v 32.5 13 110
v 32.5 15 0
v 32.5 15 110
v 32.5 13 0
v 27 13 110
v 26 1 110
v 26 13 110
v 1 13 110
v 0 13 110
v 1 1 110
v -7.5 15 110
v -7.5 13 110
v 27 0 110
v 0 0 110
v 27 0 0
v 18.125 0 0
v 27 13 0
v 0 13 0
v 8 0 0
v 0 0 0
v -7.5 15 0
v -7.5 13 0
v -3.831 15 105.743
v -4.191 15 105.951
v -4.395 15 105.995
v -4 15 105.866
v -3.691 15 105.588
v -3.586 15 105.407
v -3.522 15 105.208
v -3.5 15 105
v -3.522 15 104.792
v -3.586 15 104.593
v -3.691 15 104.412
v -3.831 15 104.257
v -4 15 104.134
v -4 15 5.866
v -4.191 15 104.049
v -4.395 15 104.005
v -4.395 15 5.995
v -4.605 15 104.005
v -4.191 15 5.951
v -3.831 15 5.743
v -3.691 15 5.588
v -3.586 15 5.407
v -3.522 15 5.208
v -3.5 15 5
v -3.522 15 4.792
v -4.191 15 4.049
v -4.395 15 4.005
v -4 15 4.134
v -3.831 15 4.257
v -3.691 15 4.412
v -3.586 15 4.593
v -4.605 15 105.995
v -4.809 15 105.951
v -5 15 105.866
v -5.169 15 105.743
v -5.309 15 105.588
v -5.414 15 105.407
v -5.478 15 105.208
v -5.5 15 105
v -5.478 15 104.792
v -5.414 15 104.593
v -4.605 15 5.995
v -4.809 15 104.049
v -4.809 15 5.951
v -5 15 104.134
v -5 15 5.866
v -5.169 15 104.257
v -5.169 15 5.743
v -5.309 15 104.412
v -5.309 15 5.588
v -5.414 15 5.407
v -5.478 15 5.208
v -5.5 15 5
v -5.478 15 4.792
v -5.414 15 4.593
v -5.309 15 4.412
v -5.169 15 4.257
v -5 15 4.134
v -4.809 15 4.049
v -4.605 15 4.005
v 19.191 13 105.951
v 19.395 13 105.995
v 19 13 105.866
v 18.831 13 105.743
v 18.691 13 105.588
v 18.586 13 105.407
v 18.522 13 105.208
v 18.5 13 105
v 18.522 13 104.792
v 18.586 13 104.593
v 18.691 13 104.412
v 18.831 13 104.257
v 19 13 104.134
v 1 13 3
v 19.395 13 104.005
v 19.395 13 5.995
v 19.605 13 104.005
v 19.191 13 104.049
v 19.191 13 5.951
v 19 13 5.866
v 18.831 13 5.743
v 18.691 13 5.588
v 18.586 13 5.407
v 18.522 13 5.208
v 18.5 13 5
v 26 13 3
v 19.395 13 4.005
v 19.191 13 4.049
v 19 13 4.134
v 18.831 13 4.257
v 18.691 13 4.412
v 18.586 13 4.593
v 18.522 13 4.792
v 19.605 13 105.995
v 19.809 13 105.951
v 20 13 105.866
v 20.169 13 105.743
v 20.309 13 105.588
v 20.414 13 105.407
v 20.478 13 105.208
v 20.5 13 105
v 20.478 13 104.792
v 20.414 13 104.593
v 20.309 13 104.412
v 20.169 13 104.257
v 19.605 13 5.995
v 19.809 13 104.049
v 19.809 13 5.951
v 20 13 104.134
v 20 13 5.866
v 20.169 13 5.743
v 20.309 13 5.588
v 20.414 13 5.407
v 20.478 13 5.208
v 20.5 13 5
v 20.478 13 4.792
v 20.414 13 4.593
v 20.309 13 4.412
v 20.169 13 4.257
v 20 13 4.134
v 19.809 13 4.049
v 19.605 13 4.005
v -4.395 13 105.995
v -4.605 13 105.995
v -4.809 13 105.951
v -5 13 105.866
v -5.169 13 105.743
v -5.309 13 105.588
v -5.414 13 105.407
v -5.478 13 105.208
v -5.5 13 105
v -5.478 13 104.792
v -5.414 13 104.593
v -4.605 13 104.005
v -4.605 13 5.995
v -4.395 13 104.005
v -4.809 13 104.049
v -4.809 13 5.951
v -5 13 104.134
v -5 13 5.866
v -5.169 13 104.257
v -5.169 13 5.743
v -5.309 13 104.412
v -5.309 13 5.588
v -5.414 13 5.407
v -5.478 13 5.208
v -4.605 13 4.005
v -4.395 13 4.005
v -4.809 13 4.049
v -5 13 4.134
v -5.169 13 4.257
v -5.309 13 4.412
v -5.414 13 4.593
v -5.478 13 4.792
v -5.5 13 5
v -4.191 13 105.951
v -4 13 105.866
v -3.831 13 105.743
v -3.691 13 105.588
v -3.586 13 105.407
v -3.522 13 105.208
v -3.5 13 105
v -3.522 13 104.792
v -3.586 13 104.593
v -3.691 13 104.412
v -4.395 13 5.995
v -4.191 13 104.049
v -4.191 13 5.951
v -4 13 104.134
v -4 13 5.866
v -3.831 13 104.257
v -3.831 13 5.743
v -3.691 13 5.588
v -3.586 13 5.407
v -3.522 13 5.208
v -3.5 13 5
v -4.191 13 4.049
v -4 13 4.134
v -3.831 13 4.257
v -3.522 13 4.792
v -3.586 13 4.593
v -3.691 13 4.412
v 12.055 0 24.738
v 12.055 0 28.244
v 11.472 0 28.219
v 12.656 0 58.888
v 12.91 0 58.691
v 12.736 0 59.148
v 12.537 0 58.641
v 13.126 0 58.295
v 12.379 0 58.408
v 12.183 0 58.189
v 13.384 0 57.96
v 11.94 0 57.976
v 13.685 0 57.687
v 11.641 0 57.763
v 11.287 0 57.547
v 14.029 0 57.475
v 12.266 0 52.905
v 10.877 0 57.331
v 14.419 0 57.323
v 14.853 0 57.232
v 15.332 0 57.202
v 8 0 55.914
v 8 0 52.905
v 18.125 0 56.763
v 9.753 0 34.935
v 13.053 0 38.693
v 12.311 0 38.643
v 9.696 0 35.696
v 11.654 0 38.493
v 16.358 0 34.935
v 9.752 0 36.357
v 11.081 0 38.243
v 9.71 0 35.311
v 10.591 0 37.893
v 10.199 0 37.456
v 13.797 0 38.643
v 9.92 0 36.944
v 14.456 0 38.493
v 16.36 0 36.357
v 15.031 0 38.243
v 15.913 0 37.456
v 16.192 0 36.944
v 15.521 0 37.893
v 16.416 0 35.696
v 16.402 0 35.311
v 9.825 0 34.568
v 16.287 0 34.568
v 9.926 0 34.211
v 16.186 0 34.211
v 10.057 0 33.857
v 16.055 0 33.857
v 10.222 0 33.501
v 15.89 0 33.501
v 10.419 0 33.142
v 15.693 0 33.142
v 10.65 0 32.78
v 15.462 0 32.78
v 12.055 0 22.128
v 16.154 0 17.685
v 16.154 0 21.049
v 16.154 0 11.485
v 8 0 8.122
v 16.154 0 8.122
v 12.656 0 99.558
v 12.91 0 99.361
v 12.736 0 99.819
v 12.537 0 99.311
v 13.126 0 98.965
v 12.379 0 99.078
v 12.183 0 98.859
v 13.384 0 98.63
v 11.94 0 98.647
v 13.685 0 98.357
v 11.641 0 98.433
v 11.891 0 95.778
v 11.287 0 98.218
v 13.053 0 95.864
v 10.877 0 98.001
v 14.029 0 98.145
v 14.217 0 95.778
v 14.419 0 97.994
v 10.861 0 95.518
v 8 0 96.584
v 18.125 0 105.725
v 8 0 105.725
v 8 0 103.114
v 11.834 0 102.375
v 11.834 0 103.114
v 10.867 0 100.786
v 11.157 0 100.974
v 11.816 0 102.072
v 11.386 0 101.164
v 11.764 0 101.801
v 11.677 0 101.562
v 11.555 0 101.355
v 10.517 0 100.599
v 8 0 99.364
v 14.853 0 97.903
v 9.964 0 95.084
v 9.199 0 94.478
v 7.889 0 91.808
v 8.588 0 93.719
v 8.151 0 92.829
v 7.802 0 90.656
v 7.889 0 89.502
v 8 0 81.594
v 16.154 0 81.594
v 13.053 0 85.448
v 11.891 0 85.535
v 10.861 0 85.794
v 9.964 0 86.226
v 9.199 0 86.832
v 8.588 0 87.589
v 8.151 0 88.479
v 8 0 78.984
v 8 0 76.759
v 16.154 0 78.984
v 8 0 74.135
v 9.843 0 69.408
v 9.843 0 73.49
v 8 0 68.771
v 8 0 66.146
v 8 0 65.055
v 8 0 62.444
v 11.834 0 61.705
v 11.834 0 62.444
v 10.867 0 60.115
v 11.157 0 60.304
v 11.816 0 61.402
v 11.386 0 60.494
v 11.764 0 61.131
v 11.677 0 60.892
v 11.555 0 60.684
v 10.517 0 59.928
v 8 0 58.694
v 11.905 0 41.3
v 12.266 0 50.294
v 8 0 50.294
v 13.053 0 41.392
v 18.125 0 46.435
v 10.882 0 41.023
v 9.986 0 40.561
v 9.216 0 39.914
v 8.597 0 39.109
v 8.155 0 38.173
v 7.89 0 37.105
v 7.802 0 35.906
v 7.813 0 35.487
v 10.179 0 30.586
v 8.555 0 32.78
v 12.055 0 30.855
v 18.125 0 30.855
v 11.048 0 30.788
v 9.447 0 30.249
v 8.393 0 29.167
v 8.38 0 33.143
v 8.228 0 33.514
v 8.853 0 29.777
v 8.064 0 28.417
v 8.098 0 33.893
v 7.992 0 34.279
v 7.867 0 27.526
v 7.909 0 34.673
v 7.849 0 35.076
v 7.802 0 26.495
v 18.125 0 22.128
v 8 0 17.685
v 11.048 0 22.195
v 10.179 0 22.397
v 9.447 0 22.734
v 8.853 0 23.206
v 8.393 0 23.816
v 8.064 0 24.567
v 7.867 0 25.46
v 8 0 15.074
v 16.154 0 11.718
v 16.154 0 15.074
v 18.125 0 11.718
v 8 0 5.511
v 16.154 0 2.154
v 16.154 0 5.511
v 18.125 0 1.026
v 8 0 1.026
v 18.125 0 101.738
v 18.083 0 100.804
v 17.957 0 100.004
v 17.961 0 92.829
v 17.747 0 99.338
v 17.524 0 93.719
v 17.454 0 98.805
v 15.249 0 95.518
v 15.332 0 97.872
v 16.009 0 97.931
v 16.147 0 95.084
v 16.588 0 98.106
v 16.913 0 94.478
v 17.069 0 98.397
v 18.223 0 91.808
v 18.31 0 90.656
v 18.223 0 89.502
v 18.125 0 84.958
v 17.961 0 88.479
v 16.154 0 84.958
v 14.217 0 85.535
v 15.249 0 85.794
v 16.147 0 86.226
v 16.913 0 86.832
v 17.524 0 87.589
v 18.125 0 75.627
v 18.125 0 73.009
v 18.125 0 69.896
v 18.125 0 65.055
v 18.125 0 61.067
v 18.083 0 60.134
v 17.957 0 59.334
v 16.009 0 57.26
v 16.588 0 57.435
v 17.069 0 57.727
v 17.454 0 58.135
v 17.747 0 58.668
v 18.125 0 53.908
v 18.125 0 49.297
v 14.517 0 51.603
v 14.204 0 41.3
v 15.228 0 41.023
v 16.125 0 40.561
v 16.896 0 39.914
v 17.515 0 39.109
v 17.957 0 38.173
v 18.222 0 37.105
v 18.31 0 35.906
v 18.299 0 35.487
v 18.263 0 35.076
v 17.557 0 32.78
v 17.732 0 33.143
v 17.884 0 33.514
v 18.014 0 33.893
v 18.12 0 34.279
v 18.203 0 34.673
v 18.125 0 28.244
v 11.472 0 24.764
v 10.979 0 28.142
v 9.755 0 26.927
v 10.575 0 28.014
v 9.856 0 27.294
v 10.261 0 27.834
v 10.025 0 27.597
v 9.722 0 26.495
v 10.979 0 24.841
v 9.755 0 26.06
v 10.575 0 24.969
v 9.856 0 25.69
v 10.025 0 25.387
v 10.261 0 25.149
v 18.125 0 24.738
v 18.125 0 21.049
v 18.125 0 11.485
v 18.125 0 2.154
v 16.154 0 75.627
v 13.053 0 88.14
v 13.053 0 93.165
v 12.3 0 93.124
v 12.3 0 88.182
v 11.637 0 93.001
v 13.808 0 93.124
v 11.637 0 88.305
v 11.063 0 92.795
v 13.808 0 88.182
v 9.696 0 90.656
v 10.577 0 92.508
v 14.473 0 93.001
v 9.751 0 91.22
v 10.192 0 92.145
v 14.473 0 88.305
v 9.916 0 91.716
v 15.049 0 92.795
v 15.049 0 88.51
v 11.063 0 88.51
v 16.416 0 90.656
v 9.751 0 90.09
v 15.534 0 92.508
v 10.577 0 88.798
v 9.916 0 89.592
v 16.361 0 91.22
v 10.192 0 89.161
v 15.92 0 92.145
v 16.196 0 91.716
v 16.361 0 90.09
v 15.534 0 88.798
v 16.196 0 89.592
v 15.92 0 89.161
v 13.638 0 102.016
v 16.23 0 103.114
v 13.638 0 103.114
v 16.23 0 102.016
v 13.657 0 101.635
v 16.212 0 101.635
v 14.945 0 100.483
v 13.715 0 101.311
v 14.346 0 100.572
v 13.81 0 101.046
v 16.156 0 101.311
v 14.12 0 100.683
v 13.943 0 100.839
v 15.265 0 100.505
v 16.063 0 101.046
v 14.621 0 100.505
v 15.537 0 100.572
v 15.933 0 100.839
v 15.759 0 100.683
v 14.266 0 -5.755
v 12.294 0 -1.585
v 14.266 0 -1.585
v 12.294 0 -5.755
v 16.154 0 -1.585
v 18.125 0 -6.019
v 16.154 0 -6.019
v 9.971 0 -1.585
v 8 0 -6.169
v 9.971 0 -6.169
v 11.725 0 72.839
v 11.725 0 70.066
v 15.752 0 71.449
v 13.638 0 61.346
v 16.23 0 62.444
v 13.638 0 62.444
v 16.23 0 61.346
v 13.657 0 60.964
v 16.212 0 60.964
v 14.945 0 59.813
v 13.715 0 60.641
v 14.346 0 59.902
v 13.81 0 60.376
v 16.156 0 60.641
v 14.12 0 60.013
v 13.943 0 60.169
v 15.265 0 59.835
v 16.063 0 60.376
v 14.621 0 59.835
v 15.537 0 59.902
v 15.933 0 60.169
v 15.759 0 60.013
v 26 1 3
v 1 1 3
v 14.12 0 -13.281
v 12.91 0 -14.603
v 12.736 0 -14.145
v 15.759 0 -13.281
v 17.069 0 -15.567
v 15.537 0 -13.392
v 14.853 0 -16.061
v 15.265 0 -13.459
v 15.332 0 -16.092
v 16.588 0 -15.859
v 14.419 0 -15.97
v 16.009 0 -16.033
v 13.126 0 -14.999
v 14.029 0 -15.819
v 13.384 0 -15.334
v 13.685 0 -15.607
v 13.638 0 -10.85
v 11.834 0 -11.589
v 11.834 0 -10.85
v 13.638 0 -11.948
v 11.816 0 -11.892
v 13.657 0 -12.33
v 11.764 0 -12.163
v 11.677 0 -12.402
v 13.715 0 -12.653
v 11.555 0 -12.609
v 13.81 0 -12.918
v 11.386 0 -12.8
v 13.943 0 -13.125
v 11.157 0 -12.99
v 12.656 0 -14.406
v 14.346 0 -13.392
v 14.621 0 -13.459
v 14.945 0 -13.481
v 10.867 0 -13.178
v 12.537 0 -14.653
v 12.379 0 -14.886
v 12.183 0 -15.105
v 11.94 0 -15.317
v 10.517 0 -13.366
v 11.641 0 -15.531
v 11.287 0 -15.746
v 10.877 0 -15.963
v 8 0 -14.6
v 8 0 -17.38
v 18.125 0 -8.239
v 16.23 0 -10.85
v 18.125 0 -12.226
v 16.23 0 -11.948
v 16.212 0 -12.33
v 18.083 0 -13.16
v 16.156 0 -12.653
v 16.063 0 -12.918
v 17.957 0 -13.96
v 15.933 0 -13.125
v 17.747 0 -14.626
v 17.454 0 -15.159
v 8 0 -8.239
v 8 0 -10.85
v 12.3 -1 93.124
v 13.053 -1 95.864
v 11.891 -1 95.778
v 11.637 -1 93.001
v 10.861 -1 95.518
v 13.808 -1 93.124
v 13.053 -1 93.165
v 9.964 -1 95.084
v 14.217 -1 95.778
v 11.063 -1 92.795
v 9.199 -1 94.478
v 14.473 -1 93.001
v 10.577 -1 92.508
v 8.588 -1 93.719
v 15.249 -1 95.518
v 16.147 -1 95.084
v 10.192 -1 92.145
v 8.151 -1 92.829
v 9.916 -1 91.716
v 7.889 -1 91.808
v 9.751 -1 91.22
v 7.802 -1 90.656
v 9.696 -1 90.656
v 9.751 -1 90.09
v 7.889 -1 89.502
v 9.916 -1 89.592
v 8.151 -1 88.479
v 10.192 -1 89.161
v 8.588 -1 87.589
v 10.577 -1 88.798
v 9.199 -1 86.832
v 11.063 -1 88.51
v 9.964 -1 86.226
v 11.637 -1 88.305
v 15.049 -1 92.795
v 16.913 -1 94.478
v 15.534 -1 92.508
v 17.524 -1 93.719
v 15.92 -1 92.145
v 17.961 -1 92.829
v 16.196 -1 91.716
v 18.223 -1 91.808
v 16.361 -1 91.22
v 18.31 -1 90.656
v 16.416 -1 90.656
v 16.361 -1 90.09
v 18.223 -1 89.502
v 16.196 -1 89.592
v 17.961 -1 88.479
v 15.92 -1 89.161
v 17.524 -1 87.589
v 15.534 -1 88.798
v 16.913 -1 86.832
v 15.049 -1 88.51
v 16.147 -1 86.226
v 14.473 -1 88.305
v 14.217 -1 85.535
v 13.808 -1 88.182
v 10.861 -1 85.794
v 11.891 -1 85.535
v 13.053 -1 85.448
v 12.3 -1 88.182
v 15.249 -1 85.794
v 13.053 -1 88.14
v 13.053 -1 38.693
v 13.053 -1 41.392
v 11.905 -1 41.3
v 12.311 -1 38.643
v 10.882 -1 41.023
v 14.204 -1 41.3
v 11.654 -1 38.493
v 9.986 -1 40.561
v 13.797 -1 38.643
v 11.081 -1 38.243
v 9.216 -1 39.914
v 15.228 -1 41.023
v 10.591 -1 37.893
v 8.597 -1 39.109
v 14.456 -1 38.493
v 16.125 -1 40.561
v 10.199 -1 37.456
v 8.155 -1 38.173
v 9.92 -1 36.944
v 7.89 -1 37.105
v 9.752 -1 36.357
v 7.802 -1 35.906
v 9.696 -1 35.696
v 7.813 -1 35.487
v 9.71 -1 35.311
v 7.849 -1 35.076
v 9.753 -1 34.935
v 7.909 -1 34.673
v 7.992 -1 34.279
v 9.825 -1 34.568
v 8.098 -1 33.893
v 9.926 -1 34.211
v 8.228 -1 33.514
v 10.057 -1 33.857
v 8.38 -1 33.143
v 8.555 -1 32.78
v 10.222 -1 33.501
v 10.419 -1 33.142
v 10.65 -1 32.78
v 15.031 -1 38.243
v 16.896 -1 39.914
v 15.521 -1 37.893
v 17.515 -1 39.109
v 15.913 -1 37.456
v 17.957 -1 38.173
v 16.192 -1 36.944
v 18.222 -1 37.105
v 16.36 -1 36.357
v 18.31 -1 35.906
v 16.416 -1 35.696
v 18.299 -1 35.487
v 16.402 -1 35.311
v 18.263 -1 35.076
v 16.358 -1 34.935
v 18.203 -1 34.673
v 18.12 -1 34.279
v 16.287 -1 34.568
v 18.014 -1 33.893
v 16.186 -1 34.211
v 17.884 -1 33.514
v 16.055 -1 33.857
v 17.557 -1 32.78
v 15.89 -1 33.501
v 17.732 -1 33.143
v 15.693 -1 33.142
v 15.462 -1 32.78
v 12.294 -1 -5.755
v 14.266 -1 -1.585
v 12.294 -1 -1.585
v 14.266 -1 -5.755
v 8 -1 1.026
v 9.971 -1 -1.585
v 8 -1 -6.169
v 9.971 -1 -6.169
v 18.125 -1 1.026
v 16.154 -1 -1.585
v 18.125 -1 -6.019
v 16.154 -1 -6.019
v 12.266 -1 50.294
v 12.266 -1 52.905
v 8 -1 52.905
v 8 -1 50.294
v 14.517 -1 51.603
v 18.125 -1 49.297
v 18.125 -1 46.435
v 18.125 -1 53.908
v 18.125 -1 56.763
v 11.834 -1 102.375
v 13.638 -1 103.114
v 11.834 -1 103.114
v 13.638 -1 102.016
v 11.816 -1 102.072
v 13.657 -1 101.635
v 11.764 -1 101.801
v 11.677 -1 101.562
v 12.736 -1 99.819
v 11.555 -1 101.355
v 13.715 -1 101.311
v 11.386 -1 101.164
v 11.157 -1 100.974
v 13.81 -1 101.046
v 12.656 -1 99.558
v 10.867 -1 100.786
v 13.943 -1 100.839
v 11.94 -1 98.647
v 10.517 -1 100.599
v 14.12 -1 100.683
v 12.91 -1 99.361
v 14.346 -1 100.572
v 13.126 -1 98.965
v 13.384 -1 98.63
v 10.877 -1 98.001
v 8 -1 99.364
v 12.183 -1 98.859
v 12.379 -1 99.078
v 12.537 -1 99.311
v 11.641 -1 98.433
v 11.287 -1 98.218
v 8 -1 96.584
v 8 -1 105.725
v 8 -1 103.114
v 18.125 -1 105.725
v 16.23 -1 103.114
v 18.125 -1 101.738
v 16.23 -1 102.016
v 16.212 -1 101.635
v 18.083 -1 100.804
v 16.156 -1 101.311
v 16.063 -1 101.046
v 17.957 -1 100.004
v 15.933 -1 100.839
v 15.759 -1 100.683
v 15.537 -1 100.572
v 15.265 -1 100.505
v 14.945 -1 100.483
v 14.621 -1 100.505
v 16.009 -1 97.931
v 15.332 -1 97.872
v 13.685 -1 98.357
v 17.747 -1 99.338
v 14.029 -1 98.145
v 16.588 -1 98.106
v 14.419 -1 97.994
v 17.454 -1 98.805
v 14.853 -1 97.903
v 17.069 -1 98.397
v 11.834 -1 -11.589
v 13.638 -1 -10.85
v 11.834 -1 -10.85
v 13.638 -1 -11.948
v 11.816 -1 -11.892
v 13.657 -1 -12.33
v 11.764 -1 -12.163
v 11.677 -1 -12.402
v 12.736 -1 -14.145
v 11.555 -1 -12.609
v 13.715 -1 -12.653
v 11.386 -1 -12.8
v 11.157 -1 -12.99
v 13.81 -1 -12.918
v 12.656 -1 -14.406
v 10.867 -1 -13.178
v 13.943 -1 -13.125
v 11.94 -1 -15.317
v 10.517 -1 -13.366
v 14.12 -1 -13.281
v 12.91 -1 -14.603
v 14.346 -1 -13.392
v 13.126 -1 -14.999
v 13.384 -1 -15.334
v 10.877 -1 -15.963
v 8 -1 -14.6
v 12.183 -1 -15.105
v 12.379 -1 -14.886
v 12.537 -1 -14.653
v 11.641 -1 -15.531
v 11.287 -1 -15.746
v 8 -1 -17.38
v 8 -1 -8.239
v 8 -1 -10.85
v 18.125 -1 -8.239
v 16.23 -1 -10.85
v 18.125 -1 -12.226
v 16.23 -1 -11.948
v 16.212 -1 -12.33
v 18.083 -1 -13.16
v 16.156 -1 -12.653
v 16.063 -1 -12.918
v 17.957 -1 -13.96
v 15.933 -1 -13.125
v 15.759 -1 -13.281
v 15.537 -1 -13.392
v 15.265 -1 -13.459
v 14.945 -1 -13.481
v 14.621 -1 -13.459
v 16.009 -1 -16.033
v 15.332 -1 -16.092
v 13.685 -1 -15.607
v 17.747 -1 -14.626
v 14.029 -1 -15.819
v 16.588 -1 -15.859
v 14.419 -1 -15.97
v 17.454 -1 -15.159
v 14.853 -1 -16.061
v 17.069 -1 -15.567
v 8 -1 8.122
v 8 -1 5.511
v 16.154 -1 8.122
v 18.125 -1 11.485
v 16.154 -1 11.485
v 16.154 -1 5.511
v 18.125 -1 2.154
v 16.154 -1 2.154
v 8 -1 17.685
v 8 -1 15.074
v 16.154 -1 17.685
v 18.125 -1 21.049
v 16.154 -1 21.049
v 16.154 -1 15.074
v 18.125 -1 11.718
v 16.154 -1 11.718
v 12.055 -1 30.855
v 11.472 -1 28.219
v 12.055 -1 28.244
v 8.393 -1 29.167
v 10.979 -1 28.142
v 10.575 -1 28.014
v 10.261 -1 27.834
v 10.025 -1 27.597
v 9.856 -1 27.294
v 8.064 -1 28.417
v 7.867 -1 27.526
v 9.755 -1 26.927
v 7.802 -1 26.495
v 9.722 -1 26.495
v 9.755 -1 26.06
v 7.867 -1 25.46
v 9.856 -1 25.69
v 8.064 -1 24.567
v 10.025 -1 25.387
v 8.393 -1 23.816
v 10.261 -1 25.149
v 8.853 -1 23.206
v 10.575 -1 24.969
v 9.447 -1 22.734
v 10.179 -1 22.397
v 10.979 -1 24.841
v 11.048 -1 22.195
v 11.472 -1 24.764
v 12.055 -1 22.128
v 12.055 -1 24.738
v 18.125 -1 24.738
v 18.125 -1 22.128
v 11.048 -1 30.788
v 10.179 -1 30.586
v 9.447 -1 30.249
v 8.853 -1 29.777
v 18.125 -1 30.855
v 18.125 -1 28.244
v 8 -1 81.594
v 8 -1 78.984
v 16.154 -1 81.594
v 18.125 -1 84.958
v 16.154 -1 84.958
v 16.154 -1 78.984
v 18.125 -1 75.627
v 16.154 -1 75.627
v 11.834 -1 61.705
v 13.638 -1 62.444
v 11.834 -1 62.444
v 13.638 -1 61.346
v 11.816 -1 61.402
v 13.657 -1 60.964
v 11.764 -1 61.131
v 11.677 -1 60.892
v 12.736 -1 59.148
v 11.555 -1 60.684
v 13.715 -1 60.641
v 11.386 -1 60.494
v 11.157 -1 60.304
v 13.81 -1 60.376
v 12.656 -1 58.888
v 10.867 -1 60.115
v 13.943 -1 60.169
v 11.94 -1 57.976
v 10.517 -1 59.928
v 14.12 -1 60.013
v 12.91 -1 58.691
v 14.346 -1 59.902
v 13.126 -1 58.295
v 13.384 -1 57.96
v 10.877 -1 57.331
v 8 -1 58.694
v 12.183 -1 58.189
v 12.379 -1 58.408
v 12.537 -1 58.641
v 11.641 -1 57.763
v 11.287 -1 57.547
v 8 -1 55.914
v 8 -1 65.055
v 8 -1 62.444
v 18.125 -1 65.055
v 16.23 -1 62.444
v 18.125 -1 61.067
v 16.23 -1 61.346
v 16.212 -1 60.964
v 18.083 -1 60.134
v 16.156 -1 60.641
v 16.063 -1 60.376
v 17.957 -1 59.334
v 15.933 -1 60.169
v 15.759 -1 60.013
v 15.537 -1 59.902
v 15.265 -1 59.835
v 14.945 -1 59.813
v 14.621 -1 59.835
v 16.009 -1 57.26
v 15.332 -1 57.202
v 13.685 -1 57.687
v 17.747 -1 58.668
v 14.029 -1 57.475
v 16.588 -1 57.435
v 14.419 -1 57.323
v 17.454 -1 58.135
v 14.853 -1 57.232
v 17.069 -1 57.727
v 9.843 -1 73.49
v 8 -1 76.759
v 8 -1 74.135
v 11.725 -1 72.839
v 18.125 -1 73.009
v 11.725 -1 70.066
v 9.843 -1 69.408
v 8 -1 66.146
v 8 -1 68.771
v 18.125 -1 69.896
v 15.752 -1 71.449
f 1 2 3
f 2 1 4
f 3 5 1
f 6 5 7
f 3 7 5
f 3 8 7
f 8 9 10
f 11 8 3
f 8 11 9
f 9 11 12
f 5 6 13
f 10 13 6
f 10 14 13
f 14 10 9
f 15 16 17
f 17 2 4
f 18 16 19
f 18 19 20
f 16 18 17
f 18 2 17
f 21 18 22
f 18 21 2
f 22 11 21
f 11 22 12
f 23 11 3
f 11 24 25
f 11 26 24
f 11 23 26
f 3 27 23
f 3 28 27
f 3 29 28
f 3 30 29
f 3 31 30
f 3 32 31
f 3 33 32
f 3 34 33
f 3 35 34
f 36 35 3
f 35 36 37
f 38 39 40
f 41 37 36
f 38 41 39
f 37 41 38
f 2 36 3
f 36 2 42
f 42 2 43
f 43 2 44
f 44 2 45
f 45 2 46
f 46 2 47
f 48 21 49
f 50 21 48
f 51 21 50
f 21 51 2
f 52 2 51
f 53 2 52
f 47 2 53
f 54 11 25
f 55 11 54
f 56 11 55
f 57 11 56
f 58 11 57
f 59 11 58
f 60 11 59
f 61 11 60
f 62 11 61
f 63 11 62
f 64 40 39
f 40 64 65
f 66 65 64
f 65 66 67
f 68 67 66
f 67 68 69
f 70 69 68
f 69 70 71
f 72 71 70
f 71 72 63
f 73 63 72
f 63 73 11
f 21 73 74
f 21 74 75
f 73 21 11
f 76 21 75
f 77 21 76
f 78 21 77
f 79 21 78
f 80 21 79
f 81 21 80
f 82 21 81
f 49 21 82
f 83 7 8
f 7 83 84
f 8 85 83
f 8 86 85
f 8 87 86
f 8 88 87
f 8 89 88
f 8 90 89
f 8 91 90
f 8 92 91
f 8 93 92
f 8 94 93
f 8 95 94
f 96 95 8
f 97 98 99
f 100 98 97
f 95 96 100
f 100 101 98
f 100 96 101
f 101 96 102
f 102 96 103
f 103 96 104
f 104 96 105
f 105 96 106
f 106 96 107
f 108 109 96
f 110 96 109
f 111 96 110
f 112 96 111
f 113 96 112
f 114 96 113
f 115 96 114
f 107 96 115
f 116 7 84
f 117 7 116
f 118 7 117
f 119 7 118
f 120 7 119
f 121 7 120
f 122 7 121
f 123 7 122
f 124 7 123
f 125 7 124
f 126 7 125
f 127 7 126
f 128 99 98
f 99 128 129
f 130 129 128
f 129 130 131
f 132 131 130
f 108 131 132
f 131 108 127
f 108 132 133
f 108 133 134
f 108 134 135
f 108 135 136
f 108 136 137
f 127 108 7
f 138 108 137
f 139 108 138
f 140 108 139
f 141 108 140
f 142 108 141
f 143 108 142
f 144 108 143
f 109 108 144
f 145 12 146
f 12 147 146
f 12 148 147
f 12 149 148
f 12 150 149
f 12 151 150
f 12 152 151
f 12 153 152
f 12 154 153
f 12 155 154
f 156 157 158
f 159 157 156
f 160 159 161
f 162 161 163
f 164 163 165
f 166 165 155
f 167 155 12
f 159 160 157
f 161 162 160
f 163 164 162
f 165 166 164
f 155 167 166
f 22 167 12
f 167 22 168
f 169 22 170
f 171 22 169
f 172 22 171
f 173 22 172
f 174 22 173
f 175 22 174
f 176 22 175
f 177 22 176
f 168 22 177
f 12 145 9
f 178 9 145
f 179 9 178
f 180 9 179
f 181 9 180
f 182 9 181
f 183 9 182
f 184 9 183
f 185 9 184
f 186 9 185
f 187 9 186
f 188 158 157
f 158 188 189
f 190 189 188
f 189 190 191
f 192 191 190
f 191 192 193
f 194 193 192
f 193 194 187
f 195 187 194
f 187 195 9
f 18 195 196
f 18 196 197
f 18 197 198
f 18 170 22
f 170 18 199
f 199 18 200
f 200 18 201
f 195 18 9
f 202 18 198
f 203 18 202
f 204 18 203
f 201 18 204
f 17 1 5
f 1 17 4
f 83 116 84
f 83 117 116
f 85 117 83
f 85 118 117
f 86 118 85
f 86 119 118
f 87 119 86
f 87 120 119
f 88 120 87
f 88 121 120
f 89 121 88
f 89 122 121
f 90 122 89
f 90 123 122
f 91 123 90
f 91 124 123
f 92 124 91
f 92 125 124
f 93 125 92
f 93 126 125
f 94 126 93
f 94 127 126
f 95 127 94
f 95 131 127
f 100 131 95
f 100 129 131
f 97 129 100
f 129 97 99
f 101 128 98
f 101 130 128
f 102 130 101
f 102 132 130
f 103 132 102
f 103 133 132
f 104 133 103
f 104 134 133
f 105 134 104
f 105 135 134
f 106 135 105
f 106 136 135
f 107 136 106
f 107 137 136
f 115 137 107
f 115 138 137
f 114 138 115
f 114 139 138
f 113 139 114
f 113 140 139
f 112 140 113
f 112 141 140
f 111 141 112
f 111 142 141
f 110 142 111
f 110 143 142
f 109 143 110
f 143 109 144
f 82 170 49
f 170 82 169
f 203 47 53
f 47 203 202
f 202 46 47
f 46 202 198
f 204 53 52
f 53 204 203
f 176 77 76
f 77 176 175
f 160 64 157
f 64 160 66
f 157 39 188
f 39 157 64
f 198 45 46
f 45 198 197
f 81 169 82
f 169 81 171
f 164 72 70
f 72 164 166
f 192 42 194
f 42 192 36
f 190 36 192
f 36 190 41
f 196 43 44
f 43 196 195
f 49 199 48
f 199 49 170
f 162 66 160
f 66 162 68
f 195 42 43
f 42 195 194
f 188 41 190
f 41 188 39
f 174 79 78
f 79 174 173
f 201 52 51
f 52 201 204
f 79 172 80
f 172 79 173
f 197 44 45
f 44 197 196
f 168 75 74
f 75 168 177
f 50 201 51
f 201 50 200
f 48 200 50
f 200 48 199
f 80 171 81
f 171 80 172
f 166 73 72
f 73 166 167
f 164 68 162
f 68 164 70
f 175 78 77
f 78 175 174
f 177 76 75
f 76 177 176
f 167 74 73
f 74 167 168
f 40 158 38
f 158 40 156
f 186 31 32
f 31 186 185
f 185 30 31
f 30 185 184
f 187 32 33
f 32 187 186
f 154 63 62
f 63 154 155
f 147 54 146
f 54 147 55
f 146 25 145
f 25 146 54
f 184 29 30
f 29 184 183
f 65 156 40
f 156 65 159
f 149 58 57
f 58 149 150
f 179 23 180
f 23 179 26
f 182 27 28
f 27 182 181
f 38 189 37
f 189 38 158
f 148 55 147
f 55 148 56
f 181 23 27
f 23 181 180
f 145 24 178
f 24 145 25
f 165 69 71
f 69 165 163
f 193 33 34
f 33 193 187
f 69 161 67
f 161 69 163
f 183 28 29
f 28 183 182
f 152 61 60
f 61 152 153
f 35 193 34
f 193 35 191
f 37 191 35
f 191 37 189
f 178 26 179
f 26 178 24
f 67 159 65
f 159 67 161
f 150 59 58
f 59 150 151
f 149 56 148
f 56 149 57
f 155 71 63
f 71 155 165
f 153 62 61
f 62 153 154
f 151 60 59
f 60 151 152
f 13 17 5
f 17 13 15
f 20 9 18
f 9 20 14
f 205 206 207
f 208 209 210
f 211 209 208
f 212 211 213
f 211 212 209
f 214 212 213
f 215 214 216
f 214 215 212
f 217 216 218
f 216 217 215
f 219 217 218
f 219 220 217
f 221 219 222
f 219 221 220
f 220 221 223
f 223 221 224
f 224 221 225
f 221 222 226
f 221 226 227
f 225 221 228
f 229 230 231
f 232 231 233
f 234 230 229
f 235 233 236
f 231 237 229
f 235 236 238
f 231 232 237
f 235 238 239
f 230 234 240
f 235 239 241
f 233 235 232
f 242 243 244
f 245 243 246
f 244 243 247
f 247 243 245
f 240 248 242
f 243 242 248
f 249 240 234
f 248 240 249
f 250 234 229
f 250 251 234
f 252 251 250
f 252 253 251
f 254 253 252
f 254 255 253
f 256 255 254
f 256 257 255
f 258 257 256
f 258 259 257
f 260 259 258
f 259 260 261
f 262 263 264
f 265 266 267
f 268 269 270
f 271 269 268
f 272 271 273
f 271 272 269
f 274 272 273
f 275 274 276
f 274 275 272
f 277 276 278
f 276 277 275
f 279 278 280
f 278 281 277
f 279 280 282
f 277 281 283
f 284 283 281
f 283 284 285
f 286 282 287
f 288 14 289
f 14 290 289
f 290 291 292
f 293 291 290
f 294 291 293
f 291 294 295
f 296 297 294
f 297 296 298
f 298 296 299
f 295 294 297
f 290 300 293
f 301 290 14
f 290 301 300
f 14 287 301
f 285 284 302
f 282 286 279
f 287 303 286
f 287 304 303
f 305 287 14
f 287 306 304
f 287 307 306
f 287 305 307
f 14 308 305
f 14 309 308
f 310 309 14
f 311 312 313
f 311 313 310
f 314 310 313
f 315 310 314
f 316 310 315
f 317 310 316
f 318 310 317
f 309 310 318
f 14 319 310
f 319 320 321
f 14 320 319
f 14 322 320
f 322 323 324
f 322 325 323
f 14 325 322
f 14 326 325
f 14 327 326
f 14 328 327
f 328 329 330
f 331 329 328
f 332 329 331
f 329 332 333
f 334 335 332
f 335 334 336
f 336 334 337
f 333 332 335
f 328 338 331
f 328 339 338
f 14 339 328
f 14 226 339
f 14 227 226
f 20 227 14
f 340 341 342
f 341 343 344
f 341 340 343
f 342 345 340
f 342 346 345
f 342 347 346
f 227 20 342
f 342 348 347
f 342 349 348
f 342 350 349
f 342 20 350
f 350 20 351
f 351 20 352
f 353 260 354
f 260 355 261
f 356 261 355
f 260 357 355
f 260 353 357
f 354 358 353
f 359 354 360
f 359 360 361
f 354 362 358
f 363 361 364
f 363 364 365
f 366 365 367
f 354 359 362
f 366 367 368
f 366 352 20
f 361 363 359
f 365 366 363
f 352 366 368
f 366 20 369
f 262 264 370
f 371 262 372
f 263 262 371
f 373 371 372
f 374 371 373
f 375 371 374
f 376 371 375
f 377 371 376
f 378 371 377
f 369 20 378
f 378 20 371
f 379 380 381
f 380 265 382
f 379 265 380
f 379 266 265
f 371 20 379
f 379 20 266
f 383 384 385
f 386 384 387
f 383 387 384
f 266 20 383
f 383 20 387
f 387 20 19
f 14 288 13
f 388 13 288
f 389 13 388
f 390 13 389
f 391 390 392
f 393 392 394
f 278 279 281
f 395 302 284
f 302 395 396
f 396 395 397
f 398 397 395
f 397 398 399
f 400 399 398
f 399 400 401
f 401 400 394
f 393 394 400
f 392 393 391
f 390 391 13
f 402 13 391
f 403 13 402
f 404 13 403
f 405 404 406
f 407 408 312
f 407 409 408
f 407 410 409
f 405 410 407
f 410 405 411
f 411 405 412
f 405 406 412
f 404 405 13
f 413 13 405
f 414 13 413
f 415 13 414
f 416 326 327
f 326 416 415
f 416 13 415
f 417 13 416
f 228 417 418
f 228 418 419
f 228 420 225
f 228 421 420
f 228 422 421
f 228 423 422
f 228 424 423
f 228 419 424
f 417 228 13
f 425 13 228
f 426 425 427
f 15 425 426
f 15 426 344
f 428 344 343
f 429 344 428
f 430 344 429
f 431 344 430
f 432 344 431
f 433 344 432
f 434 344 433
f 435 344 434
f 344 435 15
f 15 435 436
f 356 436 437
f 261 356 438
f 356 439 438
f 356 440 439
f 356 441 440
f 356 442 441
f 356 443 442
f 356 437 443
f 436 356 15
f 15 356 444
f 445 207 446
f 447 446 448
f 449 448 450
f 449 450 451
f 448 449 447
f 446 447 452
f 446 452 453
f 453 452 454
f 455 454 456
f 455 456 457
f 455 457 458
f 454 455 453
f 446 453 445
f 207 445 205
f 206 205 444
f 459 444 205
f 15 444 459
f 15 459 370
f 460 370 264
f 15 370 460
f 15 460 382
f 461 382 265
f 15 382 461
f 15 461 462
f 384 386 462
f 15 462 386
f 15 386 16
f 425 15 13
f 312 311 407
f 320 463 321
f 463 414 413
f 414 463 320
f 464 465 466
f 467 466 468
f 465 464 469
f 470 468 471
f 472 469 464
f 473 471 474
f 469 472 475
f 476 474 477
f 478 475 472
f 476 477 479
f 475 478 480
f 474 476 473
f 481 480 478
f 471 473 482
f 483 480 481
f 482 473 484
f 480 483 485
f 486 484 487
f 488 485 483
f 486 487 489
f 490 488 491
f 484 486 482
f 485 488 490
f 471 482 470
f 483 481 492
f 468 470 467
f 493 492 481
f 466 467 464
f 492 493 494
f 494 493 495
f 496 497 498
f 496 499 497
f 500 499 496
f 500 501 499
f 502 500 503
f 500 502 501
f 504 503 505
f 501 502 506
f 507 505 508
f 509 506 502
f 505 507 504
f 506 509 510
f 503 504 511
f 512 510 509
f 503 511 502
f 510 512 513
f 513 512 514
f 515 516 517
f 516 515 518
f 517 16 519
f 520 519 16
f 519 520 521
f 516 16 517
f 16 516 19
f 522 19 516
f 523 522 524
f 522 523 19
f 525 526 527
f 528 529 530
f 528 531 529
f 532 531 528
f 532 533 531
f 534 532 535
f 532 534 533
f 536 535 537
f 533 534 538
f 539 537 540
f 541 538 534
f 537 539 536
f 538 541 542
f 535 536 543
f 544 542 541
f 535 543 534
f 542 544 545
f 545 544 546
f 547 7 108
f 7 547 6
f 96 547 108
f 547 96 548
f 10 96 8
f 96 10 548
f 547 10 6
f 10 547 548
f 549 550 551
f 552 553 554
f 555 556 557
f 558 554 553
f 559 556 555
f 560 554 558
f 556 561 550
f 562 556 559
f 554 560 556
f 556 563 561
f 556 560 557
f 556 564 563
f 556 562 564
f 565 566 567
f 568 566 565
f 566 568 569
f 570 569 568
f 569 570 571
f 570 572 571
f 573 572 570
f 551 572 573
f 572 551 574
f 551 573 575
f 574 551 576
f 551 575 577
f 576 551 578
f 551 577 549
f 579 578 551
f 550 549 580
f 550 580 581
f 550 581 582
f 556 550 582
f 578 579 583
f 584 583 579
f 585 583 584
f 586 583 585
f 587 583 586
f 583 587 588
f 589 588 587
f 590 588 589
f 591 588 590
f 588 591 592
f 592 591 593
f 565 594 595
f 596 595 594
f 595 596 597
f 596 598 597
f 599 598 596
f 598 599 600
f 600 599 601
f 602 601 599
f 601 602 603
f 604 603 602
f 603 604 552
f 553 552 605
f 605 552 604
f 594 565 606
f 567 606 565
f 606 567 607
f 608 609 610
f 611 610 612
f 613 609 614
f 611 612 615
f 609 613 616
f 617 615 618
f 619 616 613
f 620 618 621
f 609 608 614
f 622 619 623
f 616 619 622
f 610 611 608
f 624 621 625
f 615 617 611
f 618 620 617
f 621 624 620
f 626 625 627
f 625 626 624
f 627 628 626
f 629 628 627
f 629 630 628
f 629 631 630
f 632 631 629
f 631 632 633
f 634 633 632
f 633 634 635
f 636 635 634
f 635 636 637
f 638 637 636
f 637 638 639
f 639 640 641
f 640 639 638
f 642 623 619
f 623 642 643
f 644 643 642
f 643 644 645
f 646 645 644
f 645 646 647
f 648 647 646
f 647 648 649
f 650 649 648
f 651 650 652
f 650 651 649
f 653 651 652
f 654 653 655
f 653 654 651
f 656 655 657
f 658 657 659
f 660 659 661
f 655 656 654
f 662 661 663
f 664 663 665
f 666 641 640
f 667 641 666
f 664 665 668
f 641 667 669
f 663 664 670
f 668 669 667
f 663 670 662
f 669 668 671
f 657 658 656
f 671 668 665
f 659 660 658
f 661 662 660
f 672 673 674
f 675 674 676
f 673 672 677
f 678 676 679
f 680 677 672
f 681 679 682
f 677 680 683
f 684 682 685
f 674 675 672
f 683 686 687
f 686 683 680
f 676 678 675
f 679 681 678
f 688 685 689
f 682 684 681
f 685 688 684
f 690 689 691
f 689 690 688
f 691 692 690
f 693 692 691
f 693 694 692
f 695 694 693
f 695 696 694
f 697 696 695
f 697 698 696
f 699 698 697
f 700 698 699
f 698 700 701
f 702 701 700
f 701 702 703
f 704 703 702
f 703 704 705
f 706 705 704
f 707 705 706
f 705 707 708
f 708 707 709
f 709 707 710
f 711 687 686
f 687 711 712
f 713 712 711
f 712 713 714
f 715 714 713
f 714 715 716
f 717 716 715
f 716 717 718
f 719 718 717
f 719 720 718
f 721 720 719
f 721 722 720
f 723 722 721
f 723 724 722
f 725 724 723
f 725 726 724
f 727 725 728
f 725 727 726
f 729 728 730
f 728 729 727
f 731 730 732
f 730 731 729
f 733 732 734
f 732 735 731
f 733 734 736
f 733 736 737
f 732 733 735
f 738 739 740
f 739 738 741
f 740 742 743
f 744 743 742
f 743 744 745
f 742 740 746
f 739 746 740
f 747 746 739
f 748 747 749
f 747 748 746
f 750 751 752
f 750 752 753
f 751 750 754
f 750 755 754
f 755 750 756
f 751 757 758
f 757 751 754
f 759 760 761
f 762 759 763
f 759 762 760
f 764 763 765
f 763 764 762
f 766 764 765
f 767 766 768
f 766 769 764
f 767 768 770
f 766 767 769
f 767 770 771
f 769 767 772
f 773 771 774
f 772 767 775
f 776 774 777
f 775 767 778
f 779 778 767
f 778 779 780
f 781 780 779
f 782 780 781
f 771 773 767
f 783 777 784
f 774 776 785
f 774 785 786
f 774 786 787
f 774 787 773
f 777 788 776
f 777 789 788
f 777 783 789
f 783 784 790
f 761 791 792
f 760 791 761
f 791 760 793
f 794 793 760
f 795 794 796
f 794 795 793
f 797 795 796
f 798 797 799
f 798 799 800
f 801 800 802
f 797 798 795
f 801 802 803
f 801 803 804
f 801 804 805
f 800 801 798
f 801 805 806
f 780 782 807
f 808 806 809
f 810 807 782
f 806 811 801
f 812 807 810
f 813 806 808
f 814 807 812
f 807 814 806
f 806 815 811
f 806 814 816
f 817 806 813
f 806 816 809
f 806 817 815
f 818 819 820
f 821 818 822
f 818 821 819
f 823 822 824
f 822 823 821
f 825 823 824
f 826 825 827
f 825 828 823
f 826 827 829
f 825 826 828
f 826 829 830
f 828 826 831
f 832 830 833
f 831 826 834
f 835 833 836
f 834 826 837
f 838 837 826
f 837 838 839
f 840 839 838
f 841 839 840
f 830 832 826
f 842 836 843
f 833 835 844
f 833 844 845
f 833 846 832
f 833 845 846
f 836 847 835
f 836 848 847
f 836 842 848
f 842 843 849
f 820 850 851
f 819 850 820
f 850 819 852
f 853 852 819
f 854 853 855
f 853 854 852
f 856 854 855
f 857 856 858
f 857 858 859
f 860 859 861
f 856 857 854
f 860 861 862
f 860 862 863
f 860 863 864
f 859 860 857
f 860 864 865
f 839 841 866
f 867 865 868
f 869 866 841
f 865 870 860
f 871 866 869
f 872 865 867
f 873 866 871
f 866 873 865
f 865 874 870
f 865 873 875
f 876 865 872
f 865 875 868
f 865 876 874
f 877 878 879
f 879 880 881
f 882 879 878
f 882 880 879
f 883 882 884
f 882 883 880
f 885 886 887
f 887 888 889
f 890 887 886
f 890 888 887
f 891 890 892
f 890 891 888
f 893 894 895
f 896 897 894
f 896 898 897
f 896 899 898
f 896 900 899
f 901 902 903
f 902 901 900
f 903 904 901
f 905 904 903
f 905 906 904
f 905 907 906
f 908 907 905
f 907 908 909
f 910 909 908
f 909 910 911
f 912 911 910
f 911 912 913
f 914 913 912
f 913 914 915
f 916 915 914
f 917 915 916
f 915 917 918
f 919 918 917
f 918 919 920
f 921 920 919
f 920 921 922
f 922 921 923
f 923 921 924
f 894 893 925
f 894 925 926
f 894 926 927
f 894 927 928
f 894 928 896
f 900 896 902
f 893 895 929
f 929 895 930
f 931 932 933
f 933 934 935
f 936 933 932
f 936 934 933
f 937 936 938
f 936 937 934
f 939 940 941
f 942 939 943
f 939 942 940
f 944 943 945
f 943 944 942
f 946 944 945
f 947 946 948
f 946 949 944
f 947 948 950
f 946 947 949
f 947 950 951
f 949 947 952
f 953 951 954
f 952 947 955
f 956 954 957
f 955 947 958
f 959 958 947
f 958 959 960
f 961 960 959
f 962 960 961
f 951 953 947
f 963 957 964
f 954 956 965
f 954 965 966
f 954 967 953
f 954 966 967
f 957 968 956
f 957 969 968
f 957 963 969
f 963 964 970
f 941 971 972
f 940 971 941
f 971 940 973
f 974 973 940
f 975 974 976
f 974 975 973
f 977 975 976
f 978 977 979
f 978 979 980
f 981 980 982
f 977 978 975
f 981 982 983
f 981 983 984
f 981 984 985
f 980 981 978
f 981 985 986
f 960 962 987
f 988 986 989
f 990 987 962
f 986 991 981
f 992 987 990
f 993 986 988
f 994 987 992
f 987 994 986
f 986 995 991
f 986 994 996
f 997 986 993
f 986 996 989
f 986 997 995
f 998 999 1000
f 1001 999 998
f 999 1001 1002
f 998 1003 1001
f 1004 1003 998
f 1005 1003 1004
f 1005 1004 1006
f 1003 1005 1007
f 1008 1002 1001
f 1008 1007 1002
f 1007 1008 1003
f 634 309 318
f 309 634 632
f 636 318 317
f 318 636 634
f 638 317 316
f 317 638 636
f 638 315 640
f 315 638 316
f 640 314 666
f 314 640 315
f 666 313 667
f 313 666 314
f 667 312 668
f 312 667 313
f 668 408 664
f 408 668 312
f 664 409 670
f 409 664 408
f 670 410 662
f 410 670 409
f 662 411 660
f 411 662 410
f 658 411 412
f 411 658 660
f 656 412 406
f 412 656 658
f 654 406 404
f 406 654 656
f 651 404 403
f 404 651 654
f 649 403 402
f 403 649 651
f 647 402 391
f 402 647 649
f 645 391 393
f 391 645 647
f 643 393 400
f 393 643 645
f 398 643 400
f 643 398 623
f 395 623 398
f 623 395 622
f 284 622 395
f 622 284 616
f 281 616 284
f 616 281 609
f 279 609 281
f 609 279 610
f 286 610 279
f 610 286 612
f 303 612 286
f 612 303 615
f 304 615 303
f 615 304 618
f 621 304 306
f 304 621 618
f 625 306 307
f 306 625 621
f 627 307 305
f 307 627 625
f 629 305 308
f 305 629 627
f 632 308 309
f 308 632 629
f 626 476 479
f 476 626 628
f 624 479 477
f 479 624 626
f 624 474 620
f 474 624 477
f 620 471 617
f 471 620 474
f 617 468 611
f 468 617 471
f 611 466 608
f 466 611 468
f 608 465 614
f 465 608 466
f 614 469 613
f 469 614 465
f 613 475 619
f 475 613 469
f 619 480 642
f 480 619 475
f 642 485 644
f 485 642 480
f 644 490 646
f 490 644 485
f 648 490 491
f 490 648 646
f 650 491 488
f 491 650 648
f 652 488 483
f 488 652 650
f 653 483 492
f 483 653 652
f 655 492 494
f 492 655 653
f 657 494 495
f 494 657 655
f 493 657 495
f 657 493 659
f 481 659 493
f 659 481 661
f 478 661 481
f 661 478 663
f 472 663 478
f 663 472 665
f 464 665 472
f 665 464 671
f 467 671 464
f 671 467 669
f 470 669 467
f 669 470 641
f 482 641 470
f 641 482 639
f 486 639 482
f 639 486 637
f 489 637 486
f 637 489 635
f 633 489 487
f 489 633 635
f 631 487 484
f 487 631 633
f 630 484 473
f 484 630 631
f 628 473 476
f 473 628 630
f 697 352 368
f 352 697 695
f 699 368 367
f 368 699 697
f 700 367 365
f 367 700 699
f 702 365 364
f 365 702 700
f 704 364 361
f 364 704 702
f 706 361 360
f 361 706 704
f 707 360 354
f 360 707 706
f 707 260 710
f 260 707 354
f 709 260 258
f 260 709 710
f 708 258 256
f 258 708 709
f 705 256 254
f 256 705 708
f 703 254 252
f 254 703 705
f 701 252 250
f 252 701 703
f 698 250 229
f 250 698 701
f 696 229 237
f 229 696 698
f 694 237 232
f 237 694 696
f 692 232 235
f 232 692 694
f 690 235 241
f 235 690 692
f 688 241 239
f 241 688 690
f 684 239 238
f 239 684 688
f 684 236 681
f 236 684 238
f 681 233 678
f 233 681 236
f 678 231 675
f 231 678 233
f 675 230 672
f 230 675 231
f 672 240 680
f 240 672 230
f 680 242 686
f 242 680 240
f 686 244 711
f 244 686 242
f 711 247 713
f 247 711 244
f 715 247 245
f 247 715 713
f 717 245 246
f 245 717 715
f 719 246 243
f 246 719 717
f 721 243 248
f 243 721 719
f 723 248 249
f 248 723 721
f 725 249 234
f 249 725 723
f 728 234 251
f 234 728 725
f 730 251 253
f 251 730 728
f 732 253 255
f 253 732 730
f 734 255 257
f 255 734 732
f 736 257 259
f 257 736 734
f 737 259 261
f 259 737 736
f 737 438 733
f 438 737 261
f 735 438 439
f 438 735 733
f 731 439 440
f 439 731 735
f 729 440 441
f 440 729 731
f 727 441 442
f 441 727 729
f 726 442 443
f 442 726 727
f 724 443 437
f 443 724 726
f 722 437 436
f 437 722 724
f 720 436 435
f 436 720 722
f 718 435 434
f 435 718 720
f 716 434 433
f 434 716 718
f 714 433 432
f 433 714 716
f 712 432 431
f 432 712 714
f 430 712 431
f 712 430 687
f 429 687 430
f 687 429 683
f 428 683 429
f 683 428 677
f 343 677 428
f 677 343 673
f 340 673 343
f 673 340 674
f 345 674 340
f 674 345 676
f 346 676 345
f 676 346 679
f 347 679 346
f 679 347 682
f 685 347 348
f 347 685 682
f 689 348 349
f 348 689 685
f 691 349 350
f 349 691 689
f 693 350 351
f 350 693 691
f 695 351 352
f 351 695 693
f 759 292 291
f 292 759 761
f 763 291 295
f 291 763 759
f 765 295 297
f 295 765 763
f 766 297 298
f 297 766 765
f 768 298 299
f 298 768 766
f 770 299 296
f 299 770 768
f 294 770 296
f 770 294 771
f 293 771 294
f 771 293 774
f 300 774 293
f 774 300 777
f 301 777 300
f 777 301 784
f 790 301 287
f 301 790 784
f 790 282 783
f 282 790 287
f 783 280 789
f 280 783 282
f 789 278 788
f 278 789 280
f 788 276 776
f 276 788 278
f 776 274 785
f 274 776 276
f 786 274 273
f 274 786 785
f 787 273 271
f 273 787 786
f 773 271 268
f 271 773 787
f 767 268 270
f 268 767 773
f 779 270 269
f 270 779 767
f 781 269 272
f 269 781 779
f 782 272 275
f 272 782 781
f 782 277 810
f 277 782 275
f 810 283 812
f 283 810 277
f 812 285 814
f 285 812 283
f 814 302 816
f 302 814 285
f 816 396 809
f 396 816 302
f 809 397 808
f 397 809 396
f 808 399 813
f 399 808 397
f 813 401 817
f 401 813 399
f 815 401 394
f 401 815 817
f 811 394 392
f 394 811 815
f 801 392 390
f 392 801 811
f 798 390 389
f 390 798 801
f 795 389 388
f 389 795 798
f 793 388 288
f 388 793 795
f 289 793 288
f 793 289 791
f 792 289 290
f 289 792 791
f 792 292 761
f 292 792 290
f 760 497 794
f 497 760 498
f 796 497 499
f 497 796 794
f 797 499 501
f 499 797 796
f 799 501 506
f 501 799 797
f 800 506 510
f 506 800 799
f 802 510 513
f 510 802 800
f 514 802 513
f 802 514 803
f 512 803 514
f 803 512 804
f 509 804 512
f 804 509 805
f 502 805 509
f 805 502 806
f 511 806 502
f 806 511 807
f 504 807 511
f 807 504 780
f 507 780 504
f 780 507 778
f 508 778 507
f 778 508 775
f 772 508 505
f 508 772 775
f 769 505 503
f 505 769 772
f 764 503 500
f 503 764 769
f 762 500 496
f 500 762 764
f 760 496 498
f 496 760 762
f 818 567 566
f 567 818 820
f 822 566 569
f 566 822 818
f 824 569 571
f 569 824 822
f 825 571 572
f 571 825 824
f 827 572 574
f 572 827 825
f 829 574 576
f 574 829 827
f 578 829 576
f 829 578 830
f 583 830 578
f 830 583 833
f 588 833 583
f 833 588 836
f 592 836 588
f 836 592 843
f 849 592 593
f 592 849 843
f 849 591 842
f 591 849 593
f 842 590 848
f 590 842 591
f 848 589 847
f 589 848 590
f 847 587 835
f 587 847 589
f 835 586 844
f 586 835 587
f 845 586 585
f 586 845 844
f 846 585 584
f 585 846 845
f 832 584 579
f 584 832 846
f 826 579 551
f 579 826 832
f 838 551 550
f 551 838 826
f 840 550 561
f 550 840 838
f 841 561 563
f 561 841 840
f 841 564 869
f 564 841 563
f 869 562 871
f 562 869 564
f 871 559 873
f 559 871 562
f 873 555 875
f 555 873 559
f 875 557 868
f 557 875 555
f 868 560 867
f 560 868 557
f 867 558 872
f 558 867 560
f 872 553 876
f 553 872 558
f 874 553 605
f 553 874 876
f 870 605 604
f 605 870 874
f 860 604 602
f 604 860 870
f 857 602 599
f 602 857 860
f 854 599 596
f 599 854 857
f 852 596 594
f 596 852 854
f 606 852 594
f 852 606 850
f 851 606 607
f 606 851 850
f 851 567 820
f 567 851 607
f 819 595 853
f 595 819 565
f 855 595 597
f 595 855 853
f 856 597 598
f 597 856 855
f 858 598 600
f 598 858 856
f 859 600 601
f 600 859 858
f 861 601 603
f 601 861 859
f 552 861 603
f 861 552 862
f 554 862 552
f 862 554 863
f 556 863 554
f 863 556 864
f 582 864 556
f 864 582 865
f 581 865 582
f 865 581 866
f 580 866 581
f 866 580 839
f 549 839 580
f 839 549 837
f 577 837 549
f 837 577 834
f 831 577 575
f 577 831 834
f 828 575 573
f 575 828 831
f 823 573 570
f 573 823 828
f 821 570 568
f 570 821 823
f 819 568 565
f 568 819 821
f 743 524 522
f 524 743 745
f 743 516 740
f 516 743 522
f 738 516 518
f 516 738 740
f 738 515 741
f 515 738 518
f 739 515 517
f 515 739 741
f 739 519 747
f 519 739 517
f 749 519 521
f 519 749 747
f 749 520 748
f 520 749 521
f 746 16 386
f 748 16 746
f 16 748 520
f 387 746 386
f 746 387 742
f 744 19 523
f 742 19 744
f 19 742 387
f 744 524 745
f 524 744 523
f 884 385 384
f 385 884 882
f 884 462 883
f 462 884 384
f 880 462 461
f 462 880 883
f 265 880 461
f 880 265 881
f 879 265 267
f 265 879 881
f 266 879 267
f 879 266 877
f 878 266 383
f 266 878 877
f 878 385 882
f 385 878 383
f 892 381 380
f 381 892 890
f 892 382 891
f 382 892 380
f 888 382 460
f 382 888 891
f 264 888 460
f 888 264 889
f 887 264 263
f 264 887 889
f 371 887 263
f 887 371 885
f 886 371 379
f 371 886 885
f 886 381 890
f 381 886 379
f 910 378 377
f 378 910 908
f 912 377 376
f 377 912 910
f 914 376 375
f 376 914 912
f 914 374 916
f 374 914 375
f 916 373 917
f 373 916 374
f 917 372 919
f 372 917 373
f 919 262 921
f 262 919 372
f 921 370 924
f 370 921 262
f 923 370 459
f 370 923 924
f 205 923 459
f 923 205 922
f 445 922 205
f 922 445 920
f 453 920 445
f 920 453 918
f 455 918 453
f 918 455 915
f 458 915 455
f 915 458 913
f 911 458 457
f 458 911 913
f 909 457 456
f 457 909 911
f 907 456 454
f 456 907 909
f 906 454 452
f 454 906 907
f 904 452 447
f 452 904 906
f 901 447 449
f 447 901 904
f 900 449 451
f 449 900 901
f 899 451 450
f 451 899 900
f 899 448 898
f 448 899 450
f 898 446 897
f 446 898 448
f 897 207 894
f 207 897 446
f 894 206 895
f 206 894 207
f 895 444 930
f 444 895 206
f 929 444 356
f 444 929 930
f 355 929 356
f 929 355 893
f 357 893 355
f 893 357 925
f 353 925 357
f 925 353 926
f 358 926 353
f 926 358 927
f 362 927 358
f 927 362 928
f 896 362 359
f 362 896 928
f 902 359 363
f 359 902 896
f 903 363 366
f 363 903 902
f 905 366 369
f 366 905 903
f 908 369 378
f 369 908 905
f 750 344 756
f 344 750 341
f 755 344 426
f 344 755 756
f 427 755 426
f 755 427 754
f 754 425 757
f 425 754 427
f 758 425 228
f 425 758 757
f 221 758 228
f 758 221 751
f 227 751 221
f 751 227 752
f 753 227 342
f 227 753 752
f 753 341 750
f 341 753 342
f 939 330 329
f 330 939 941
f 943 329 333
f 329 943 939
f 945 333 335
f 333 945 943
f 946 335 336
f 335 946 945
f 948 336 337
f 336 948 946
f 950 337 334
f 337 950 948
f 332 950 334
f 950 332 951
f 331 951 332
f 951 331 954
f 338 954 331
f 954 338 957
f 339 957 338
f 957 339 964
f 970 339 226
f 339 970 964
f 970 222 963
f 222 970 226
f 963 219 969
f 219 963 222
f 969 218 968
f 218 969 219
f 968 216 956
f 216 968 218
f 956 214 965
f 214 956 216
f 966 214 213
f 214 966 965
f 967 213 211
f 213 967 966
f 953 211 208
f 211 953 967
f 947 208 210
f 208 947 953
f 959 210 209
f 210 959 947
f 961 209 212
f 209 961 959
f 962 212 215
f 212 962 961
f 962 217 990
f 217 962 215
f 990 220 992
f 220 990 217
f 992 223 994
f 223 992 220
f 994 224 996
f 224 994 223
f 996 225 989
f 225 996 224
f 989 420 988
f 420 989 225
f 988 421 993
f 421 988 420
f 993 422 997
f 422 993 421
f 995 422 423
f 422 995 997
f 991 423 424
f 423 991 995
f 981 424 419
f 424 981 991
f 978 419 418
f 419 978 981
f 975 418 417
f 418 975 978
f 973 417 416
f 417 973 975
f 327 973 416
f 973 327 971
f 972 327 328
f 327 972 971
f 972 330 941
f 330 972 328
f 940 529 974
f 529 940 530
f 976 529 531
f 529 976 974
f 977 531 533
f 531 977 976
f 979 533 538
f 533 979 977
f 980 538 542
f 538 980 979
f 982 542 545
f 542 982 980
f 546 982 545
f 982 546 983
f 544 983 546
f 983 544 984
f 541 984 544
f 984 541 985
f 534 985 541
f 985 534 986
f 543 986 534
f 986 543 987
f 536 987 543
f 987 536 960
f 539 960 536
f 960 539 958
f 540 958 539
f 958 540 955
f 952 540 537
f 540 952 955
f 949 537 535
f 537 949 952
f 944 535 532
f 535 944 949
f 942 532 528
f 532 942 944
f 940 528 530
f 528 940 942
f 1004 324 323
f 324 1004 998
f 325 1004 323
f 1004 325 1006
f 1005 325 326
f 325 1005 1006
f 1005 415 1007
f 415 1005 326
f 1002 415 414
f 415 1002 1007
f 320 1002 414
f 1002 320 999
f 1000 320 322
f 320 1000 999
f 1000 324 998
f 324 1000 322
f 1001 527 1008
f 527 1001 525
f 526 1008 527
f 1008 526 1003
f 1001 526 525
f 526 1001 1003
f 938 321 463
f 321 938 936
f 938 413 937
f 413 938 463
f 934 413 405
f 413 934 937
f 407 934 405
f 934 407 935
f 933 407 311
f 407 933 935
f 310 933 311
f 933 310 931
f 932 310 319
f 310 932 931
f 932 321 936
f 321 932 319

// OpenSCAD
$fn=30;

tw= 25;
td=12;
ttd=15;
th=110;


    box();
    translate([8,0,107])
    rotate([90,90,0])
    linear_extrude(height=1)
    text("ROTARY CUTTER", font = "FONTIN:style=Bold");


module box(){
union(){

translate([-(tw + 15-tw)/2,ttd-2,0])
difference(){
cube([tw + 15,2,th]);
    
    translate([3,0,5])
    rotate([-90,0,0])
    cylinder(r=1,h=4);
    
    translate([3,0,110-5])
    rotate([-90,0,0])
    cylinder(r=1,h=4);
    
    translate([30-3,0,110-5])
    rotate([-90,0,0])
    cylinder(r=1,h=4);
    
    translate([30-3,0,5])
    rotate([-90,0,0])
    cylinder(r=1,h=4);
    
    }
difference(){

//box
cube([tw+2,ttd,th]);    
translate([1,1,3])
cube([tw,td,th]);
    
}

}

}
